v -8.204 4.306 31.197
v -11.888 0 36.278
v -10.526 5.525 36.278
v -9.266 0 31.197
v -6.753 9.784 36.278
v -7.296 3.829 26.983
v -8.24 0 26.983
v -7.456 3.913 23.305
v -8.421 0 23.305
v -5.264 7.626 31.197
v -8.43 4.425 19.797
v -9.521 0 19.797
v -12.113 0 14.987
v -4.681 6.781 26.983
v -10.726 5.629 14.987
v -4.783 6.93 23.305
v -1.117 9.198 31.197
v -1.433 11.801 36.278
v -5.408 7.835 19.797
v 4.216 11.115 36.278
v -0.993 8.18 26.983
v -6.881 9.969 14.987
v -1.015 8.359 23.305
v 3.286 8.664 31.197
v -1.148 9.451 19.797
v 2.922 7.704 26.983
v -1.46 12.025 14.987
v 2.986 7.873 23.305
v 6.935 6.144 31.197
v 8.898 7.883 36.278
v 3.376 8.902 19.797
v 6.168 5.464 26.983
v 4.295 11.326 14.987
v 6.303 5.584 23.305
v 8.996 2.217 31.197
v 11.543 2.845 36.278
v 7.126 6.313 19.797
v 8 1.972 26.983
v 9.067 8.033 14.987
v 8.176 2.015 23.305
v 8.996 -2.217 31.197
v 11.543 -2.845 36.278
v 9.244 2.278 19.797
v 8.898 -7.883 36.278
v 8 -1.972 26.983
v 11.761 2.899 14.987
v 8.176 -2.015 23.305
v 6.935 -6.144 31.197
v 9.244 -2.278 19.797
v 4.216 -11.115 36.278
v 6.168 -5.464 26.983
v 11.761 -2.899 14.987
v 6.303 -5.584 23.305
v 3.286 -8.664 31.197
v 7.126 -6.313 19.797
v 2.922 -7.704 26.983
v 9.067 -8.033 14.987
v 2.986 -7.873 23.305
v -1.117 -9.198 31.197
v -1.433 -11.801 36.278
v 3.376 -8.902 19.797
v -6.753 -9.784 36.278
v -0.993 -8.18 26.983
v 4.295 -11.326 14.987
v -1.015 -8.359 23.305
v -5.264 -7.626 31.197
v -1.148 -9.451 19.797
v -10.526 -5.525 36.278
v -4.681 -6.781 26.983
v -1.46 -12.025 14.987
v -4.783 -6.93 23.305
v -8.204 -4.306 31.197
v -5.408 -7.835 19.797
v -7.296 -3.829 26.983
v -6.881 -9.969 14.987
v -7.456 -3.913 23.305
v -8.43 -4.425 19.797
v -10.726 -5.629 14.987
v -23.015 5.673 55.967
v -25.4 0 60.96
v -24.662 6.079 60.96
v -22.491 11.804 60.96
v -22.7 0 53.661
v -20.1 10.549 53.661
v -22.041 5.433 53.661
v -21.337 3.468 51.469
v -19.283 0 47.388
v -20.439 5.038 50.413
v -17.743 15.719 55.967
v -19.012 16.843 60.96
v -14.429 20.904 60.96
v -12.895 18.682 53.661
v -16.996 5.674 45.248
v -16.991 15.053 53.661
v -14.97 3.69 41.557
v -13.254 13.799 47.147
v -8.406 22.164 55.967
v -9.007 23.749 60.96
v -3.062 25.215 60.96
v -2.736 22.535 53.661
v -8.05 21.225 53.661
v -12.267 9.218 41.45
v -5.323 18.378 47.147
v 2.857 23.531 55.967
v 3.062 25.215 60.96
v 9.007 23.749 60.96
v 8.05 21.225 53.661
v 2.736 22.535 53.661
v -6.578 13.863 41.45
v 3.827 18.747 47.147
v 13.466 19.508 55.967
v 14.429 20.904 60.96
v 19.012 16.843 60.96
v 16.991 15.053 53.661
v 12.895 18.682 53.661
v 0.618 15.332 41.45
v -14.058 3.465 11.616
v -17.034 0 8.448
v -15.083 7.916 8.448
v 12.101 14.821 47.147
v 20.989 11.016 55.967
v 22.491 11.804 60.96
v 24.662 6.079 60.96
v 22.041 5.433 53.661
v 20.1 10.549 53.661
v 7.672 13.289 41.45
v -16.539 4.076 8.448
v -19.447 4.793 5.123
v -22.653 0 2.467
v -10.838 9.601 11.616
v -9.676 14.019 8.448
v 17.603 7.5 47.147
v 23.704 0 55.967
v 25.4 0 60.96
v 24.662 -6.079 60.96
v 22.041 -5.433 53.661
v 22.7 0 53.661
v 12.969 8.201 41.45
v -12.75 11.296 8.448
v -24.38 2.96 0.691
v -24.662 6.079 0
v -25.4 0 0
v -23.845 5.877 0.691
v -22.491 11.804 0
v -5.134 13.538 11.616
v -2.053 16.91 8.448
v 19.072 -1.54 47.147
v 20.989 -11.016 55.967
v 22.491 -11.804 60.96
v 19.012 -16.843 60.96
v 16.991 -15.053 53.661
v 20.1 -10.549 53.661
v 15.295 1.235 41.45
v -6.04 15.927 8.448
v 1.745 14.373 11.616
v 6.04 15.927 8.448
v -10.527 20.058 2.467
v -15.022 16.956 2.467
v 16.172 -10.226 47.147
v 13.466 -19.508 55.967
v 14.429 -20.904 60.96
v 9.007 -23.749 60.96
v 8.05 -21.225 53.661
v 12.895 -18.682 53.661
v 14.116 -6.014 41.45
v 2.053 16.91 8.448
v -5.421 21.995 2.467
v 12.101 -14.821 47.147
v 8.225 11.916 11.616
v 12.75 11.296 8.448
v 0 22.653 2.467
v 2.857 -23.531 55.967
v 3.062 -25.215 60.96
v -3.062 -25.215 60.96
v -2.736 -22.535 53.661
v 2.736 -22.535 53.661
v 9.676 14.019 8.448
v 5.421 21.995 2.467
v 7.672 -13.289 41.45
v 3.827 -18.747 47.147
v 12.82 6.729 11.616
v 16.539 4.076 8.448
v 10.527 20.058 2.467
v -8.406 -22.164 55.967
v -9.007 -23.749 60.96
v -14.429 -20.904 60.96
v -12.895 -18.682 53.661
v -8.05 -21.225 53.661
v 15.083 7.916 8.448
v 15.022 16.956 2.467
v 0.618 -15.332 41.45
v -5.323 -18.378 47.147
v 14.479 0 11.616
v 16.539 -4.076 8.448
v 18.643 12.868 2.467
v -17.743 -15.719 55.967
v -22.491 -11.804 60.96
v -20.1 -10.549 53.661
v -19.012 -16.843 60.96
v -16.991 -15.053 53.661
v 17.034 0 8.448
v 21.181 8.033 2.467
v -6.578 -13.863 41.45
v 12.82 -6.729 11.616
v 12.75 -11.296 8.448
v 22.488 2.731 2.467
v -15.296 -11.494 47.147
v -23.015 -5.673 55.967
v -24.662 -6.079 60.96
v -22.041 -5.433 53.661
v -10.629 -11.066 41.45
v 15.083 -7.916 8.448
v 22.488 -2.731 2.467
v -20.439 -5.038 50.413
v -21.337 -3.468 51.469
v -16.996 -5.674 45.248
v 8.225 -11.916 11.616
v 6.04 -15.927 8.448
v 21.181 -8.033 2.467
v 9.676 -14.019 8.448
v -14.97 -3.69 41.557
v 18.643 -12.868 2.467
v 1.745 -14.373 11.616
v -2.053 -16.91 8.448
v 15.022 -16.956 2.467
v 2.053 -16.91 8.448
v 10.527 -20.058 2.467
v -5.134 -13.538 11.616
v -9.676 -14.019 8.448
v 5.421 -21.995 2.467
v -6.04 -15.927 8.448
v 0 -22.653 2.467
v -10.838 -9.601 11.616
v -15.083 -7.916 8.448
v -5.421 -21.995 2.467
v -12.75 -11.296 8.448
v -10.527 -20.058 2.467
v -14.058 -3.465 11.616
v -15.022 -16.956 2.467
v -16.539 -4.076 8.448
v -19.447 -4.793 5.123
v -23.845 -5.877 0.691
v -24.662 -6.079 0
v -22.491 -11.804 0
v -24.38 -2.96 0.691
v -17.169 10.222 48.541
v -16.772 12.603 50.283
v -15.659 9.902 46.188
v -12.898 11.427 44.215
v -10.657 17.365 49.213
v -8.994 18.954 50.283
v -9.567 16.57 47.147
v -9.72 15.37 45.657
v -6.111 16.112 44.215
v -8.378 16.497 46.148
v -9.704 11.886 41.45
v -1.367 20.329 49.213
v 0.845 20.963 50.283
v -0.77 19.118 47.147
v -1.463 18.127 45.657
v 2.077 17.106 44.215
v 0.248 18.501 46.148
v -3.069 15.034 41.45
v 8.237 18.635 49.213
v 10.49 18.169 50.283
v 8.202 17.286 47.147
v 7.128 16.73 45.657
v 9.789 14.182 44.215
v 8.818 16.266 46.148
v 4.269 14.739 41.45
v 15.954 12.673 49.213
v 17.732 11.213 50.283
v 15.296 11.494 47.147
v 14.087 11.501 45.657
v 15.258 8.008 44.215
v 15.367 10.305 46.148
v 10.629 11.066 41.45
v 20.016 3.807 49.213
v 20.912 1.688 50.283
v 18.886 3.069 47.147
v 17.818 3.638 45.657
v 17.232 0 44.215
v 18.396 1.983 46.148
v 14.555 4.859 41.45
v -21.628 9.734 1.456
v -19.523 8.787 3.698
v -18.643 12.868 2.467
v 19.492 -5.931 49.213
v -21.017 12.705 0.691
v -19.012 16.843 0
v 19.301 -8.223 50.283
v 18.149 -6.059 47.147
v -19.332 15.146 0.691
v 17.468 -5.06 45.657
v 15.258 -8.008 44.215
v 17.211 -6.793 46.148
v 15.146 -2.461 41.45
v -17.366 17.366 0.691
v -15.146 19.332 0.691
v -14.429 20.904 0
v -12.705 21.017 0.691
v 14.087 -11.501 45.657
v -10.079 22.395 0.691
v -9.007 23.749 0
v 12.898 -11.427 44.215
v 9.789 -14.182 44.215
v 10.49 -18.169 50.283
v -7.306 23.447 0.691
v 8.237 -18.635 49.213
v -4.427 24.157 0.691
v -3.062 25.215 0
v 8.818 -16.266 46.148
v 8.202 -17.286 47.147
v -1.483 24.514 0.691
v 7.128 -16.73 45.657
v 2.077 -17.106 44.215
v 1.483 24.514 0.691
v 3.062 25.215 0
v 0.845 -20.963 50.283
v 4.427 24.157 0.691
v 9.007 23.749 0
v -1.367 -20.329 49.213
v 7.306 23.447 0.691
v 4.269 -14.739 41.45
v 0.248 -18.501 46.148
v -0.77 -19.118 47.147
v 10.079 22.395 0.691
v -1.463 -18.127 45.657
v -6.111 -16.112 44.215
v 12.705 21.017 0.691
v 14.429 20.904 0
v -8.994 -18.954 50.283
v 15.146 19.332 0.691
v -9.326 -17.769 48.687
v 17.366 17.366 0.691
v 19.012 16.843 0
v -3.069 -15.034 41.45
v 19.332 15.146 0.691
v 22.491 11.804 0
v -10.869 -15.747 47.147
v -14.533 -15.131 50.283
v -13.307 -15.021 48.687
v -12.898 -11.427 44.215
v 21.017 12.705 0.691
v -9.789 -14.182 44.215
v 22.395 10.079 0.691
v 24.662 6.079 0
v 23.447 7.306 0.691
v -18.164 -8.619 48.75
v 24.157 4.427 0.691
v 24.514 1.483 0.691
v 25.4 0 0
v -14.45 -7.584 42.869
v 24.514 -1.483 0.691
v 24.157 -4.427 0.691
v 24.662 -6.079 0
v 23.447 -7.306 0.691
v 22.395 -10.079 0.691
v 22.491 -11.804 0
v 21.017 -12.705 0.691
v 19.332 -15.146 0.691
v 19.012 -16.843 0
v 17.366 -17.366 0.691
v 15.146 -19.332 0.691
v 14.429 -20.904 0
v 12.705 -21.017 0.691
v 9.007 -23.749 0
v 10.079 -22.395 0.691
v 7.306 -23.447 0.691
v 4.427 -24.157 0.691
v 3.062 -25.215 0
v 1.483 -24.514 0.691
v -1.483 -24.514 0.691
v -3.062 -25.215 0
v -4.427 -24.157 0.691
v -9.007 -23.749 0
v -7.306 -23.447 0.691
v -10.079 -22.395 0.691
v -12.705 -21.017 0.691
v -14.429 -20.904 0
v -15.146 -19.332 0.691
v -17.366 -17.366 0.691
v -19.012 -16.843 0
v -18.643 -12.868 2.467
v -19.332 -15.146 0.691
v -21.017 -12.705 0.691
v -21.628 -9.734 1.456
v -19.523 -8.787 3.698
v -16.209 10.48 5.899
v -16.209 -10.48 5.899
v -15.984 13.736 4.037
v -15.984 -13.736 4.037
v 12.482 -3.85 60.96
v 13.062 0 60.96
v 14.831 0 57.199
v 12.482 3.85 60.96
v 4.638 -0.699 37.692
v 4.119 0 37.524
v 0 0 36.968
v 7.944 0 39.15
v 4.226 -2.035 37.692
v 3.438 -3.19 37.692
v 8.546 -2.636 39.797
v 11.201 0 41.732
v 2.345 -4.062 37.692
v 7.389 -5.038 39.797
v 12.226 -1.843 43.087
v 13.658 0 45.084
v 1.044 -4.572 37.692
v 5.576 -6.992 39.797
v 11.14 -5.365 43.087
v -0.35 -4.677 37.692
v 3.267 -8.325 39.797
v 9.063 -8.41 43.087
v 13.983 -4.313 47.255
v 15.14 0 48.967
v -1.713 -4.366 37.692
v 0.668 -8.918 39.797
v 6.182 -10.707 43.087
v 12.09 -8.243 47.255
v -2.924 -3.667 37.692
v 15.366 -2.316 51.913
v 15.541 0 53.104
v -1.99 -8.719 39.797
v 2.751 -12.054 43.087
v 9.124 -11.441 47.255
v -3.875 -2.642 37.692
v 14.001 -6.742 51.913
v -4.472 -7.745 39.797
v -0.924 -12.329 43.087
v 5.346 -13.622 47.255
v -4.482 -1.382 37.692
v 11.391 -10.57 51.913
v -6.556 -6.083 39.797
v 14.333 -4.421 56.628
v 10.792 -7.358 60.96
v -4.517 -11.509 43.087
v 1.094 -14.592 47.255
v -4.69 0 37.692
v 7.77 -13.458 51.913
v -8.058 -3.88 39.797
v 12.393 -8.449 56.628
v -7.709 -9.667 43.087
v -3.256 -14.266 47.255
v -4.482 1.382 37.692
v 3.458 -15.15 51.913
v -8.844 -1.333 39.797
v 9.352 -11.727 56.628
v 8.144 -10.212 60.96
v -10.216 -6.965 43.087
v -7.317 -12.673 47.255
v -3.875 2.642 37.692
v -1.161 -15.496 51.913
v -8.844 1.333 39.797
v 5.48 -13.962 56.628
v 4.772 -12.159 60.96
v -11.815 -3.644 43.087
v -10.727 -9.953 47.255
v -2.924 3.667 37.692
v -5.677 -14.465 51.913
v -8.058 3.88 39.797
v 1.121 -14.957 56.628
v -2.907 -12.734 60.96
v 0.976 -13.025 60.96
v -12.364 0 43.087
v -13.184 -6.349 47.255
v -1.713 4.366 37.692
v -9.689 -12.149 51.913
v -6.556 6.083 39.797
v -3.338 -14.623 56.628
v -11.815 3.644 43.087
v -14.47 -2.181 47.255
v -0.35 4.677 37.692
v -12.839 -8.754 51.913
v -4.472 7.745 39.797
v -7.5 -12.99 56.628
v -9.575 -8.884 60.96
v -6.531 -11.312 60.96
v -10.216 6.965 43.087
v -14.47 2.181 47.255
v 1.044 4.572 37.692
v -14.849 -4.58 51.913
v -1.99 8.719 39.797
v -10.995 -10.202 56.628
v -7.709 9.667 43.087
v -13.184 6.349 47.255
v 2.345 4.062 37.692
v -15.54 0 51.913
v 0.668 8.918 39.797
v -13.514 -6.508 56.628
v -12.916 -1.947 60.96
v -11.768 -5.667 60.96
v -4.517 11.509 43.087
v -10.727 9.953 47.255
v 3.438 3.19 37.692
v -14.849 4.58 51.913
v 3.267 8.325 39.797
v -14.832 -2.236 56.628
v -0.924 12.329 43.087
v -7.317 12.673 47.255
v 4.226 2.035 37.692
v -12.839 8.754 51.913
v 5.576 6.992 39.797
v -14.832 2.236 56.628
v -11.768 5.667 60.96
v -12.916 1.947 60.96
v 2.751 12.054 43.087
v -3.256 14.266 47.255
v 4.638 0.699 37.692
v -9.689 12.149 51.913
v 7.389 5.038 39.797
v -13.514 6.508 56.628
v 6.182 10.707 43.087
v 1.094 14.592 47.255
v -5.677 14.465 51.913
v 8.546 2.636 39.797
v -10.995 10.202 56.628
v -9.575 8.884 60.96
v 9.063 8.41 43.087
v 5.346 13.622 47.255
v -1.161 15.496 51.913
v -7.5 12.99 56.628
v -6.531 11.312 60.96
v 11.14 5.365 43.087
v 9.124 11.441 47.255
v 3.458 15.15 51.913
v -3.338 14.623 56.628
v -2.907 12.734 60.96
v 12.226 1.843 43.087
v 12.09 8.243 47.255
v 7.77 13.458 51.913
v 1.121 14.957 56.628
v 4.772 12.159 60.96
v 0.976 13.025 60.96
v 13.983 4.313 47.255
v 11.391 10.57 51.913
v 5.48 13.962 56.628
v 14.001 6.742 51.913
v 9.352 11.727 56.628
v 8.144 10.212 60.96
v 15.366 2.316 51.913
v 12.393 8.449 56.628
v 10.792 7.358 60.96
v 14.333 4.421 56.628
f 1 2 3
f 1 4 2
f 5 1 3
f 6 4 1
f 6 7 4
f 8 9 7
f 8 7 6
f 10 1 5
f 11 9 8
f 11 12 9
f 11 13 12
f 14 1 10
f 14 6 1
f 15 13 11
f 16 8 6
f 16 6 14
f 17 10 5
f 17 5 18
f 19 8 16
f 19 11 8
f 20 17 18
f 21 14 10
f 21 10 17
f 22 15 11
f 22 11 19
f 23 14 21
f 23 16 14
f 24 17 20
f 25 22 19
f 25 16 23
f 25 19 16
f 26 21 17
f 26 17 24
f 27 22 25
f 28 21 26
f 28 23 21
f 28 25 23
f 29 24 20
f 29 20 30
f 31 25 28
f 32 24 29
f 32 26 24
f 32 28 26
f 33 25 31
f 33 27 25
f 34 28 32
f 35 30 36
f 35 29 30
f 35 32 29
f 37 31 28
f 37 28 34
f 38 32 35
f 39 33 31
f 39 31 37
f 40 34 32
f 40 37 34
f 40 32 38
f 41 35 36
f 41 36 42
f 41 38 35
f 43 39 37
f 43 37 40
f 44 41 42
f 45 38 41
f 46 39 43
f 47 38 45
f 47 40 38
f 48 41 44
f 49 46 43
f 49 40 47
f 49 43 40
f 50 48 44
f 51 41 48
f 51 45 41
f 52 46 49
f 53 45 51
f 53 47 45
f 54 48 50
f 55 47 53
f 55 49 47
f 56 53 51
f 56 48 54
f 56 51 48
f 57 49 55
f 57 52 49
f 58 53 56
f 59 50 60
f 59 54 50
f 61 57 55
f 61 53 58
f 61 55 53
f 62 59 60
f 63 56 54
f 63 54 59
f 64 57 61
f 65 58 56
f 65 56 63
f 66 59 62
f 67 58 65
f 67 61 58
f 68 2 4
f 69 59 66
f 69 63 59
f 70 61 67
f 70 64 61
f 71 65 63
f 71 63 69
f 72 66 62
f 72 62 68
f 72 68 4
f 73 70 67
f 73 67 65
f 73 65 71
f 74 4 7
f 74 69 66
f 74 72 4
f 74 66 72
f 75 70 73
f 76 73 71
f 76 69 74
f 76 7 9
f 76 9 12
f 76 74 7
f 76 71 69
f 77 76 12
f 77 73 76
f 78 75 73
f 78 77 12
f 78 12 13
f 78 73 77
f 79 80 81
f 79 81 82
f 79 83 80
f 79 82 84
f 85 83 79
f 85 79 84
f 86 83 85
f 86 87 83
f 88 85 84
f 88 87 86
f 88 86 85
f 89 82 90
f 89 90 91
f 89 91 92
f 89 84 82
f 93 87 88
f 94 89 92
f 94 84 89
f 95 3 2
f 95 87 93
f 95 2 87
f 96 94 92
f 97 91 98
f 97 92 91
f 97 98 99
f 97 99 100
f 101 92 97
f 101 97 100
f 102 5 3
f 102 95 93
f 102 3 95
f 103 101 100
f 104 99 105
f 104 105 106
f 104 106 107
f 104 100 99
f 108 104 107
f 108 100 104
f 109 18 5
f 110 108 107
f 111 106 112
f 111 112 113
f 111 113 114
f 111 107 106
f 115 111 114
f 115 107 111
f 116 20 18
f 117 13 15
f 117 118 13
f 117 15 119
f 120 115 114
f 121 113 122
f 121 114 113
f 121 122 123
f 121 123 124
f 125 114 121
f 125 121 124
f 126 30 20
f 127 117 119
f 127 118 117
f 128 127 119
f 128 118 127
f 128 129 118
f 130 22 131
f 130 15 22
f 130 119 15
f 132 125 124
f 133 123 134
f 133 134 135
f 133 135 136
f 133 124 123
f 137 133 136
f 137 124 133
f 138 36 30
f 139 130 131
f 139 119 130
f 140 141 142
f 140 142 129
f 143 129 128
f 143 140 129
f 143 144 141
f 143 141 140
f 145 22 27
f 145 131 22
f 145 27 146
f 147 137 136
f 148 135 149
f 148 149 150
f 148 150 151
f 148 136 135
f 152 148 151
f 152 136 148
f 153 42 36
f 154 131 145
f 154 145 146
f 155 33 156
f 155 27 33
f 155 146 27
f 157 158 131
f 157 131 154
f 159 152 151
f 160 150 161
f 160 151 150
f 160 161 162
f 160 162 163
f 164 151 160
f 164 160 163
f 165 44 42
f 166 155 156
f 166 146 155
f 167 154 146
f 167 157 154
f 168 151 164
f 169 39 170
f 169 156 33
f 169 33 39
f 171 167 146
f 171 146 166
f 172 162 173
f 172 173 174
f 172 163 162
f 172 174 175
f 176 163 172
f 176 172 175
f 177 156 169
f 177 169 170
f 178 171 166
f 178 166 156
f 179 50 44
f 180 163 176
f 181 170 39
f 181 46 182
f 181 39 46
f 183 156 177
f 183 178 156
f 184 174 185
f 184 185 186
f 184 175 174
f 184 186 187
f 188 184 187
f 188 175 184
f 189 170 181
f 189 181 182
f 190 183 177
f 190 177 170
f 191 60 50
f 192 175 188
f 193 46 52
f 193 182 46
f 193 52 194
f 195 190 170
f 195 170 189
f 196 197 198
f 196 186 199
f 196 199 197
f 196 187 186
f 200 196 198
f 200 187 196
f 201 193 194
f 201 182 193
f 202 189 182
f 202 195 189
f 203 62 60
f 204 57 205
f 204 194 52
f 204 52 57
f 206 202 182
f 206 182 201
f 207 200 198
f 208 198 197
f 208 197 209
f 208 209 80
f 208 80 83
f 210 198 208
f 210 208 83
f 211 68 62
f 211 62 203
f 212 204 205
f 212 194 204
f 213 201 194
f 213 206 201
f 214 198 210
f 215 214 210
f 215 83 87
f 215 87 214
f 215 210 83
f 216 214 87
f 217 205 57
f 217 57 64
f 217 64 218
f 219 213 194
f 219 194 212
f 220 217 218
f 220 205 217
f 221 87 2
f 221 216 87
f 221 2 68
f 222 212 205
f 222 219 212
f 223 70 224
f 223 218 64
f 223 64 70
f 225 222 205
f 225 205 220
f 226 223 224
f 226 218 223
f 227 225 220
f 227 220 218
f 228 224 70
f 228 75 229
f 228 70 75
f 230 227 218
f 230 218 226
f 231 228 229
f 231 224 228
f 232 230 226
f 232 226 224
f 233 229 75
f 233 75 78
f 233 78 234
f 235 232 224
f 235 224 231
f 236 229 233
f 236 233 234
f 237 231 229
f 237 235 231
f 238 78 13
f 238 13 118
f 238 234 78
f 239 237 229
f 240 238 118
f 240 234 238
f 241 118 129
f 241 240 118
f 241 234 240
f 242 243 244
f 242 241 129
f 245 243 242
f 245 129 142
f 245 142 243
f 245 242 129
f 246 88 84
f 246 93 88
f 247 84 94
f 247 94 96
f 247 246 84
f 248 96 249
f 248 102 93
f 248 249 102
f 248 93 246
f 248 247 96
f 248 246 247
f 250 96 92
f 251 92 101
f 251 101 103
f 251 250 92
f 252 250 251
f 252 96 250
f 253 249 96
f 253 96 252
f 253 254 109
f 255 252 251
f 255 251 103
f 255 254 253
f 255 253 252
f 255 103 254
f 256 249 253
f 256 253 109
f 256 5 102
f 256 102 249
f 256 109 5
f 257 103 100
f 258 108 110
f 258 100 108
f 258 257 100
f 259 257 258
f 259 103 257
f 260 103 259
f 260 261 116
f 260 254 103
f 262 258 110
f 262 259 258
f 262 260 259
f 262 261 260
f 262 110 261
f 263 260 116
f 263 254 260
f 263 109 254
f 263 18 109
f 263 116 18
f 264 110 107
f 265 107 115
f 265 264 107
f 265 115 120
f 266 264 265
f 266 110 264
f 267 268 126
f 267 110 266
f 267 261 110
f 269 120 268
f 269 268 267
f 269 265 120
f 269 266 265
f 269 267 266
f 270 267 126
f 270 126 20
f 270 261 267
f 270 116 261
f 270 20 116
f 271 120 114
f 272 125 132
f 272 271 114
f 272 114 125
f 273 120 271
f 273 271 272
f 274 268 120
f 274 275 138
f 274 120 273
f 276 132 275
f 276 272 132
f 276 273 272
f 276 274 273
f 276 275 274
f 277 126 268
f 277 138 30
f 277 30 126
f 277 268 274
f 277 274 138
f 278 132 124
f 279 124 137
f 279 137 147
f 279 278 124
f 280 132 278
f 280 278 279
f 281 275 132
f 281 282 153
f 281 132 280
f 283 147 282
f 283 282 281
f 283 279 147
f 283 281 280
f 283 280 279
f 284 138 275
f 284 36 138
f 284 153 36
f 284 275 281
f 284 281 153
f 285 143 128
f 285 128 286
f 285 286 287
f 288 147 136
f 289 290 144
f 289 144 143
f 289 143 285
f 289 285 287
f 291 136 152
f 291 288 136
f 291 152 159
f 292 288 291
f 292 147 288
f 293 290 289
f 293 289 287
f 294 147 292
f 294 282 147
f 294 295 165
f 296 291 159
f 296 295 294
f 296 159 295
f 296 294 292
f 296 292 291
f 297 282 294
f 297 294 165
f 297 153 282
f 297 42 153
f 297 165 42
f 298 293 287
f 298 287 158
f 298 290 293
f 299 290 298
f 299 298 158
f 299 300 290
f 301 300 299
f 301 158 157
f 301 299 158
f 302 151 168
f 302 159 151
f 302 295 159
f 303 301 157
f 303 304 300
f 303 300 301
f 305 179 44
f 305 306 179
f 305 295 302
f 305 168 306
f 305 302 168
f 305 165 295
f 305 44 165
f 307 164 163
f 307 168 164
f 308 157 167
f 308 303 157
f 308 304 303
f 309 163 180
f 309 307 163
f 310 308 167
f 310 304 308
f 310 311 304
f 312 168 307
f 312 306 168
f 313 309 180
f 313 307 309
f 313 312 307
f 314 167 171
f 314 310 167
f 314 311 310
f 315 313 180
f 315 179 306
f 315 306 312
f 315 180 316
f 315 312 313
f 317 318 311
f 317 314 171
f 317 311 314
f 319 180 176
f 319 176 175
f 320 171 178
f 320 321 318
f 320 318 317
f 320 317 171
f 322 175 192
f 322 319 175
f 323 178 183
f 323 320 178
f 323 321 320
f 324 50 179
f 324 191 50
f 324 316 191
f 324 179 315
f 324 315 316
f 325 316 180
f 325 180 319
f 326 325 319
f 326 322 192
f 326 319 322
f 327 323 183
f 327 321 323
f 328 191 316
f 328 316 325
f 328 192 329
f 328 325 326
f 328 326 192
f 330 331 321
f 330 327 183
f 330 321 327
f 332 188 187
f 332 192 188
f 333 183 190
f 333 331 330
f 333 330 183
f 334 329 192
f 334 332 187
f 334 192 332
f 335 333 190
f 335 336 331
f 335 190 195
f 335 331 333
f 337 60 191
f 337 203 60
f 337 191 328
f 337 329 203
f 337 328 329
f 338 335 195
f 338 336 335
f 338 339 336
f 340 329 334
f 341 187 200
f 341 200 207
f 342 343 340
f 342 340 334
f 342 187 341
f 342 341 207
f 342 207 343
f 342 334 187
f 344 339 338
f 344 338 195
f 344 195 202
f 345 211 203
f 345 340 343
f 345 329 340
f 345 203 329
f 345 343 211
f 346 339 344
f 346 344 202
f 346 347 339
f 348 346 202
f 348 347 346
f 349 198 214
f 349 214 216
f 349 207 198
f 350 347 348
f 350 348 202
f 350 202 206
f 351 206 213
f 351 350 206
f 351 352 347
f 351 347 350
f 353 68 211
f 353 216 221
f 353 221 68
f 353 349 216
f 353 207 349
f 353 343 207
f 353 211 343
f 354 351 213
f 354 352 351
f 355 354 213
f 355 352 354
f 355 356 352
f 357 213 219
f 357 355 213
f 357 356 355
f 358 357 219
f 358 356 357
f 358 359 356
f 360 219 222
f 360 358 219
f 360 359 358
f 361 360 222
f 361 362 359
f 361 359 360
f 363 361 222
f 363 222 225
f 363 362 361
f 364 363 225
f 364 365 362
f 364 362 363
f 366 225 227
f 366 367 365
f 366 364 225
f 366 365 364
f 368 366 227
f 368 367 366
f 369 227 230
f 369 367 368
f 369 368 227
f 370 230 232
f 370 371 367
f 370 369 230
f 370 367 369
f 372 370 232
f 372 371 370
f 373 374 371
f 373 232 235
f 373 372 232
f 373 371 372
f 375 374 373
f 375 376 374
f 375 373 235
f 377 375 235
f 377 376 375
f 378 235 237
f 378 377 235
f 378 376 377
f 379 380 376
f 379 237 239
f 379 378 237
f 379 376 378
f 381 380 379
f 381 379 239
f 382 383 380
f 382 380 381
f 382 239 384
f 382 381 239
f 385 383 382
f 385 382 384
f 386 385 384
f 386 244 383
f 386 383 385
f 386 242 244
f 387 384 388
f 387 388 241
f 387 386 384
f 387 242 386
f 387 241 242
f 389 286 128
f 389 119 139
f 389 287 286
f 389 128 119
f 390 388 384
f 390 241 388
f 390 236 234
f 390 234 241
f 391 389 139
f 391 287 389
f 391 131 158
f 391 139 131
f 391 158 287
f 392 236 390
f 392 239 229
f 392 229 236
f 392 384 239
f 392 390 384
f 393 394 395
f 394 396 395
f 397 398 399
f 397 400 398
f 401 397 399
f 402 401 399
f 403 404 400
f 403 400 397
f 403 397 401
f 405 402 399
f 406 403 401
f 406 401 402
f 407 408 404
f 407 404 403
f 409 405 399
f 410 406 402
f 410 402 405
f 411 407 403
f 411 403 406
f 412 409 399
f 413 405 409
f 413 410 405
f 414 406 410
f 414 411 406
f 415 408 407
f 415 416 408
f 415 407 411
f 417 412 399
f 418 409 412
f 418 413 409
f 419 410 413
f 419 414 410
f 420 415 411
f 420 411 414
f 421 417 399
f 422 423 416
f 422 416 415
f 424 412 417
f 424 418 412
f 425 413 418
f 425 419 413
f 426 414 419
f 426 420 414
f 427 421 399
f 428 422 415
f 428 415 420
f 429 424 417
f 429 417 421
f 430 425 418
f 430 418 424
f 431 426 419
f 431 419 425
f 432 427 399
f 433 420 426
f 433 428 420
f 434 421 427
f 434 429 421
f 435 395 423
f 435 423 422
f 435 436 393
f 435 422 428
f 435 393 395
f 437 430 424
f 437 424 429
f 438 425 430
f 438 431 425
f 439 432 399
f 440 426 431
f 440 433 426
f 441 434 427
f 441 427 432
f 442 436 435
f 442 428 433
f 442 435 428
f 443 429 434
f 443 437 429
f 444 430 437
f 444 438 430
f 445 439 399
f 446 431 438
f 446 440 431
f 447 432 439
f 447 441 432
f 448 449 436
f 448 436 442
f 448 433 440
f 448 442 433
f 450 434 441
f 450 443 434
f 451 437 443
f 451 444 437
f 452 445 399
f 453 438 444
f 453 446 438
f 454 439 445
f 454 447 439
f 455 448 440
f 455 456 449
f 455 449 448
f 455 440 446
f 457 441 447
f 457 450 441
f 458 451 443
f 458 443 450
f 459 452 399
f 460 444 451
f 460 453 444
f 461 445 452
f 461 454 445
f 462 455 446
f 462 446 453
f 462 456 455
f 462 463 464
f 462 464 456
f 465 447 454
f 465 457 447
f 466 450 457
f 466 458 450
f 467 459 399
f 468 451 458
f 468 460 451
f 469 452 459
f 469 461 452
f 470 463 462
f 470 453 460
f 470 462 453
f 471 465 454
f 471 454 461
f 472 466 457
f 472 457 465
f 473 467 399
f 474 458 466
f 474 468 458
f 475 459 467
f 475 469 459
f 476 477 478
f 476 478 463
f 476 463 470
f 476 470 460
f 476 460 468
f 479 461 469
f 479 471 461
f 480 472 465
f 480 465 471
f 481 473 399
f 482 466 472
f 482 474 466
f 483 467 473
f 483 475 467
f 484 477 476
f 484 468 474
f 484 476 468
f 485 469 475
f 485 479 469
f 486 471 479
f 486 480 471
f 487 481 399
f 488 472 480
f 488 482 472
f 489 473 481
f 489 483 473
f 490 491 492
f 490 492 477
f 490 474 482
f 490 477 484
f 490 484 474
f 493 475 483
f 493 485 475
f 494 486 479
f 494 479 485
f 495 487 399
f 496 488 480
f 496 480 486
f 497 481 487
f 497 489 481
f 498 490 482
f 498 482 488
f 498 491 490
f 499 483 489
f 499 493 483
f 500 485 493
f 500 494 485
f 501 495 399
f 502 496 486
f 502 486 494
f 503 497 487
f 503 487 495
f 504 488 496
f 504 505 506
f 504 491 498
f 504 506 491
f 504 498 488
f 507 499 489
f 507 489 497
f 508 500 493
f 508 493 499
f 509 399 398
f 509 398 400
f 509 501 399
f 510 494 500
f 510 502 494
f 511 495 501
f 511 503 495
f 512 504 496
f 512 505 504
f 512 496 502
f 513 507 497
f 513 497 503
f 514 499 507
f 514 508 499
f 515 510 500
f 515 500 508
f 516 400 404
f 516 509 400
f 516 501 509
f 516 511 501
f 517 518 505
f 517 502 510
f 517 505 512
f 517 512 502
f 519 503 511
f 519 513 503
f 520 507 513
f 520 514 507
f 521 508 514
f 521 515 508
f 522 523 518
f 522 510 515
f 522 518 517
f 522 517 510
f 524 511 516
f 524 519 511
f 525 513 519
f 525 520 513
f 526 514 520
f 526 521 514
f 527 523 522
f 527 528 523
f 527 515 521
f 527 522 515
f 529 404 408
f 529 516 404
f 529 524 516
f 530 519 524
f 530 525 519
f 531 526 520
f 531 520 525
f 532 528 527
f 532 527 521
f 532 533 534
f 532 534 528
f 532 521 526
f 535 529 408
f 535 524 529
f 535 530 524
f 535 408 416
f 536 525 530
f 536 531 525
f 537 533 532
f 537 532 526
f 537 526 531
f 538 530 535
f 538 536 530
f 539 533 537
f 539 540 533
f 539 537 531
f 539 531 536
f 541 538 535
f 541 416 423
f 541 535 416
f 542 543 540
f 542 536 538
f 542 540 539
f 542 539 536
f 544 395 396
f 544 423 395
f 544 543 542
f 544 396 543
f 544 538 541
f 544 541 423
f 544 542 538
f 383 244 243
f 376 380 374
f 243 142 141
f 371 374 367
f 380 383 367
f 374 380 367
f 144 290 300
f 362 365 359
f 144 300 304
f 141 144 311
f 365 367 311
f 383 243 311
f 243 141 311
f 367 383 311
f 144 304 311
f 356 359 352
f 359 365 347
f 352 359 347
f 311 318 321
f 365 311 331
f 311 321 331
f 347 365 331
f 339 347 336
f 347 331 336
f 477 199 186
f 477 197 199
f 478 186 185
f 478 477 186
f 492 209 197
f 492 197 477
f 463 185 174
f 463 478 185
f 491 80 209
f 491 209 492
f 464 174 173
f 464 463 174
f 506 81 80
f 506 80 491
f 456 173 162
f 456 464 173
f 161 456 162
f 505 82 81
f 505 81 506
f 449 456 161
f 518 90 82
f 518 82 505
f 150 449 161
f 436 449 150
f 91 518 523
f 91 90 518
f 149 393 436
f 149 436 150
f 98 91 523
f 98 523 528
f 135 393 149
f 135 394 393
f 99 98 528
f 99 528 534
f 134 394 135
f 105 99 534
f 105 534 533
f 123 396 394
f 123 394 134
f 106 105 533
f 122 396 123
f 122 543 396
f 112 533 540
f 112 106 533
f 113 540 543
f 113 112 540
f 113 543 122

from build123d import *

# Parameters (mm, degrees)
F0_R     = 25.4
F1_DEPTH = 60.96


with BuildPart() as f1:
    # F0 (on Top) → F1 (new body)
    with BuildSketch(Plane.XY):
        Circle(F0_R)
    extrude(amount=F1_DEPTH)

    # F2 (on Front) → F3 (revolve, cut)
    with BuildSketch(Plane.XZ):
        with BuildLine():
            add(Edge.make_bspline(
                [(-25.4, 60.96), (-20.3884669464, 42.7774440407), (6.2940299266, 28.2491347423), (-24.9100290239, 0.1987792057), (-25.4, 0)],
                knots=[0, 0, 0, 0, 0.5481880277, 1, 1, 1, 1], degree=3))
            Line((-25.4, 60.96), (-25.4, 0))
        make_face()
    revolve(axis=Axis((0, 0, 43.6710192575), (0, 0, -1)), mode=Mode.SUBTRACT)

    # F4 (on Front) → F5 (revolve, cut)
    with BuildSketch(Plane.XZ):
        with BuildLine():
            Line((0, 65.2791708708), (0, 36.9683429599))
            ThreePointArc((0, 36.9683429599), (15.5515223742, 52.519865334), (0, 68.0713877082))
            Line((0, 68.0713877082), (0, 65.2791708708))
        make_face()
    revolve(axis=Axis((0, 0, 51.1237569153), (0, 0, -1)), mode=Mode.SUBTRACT)


solid = f1.part
